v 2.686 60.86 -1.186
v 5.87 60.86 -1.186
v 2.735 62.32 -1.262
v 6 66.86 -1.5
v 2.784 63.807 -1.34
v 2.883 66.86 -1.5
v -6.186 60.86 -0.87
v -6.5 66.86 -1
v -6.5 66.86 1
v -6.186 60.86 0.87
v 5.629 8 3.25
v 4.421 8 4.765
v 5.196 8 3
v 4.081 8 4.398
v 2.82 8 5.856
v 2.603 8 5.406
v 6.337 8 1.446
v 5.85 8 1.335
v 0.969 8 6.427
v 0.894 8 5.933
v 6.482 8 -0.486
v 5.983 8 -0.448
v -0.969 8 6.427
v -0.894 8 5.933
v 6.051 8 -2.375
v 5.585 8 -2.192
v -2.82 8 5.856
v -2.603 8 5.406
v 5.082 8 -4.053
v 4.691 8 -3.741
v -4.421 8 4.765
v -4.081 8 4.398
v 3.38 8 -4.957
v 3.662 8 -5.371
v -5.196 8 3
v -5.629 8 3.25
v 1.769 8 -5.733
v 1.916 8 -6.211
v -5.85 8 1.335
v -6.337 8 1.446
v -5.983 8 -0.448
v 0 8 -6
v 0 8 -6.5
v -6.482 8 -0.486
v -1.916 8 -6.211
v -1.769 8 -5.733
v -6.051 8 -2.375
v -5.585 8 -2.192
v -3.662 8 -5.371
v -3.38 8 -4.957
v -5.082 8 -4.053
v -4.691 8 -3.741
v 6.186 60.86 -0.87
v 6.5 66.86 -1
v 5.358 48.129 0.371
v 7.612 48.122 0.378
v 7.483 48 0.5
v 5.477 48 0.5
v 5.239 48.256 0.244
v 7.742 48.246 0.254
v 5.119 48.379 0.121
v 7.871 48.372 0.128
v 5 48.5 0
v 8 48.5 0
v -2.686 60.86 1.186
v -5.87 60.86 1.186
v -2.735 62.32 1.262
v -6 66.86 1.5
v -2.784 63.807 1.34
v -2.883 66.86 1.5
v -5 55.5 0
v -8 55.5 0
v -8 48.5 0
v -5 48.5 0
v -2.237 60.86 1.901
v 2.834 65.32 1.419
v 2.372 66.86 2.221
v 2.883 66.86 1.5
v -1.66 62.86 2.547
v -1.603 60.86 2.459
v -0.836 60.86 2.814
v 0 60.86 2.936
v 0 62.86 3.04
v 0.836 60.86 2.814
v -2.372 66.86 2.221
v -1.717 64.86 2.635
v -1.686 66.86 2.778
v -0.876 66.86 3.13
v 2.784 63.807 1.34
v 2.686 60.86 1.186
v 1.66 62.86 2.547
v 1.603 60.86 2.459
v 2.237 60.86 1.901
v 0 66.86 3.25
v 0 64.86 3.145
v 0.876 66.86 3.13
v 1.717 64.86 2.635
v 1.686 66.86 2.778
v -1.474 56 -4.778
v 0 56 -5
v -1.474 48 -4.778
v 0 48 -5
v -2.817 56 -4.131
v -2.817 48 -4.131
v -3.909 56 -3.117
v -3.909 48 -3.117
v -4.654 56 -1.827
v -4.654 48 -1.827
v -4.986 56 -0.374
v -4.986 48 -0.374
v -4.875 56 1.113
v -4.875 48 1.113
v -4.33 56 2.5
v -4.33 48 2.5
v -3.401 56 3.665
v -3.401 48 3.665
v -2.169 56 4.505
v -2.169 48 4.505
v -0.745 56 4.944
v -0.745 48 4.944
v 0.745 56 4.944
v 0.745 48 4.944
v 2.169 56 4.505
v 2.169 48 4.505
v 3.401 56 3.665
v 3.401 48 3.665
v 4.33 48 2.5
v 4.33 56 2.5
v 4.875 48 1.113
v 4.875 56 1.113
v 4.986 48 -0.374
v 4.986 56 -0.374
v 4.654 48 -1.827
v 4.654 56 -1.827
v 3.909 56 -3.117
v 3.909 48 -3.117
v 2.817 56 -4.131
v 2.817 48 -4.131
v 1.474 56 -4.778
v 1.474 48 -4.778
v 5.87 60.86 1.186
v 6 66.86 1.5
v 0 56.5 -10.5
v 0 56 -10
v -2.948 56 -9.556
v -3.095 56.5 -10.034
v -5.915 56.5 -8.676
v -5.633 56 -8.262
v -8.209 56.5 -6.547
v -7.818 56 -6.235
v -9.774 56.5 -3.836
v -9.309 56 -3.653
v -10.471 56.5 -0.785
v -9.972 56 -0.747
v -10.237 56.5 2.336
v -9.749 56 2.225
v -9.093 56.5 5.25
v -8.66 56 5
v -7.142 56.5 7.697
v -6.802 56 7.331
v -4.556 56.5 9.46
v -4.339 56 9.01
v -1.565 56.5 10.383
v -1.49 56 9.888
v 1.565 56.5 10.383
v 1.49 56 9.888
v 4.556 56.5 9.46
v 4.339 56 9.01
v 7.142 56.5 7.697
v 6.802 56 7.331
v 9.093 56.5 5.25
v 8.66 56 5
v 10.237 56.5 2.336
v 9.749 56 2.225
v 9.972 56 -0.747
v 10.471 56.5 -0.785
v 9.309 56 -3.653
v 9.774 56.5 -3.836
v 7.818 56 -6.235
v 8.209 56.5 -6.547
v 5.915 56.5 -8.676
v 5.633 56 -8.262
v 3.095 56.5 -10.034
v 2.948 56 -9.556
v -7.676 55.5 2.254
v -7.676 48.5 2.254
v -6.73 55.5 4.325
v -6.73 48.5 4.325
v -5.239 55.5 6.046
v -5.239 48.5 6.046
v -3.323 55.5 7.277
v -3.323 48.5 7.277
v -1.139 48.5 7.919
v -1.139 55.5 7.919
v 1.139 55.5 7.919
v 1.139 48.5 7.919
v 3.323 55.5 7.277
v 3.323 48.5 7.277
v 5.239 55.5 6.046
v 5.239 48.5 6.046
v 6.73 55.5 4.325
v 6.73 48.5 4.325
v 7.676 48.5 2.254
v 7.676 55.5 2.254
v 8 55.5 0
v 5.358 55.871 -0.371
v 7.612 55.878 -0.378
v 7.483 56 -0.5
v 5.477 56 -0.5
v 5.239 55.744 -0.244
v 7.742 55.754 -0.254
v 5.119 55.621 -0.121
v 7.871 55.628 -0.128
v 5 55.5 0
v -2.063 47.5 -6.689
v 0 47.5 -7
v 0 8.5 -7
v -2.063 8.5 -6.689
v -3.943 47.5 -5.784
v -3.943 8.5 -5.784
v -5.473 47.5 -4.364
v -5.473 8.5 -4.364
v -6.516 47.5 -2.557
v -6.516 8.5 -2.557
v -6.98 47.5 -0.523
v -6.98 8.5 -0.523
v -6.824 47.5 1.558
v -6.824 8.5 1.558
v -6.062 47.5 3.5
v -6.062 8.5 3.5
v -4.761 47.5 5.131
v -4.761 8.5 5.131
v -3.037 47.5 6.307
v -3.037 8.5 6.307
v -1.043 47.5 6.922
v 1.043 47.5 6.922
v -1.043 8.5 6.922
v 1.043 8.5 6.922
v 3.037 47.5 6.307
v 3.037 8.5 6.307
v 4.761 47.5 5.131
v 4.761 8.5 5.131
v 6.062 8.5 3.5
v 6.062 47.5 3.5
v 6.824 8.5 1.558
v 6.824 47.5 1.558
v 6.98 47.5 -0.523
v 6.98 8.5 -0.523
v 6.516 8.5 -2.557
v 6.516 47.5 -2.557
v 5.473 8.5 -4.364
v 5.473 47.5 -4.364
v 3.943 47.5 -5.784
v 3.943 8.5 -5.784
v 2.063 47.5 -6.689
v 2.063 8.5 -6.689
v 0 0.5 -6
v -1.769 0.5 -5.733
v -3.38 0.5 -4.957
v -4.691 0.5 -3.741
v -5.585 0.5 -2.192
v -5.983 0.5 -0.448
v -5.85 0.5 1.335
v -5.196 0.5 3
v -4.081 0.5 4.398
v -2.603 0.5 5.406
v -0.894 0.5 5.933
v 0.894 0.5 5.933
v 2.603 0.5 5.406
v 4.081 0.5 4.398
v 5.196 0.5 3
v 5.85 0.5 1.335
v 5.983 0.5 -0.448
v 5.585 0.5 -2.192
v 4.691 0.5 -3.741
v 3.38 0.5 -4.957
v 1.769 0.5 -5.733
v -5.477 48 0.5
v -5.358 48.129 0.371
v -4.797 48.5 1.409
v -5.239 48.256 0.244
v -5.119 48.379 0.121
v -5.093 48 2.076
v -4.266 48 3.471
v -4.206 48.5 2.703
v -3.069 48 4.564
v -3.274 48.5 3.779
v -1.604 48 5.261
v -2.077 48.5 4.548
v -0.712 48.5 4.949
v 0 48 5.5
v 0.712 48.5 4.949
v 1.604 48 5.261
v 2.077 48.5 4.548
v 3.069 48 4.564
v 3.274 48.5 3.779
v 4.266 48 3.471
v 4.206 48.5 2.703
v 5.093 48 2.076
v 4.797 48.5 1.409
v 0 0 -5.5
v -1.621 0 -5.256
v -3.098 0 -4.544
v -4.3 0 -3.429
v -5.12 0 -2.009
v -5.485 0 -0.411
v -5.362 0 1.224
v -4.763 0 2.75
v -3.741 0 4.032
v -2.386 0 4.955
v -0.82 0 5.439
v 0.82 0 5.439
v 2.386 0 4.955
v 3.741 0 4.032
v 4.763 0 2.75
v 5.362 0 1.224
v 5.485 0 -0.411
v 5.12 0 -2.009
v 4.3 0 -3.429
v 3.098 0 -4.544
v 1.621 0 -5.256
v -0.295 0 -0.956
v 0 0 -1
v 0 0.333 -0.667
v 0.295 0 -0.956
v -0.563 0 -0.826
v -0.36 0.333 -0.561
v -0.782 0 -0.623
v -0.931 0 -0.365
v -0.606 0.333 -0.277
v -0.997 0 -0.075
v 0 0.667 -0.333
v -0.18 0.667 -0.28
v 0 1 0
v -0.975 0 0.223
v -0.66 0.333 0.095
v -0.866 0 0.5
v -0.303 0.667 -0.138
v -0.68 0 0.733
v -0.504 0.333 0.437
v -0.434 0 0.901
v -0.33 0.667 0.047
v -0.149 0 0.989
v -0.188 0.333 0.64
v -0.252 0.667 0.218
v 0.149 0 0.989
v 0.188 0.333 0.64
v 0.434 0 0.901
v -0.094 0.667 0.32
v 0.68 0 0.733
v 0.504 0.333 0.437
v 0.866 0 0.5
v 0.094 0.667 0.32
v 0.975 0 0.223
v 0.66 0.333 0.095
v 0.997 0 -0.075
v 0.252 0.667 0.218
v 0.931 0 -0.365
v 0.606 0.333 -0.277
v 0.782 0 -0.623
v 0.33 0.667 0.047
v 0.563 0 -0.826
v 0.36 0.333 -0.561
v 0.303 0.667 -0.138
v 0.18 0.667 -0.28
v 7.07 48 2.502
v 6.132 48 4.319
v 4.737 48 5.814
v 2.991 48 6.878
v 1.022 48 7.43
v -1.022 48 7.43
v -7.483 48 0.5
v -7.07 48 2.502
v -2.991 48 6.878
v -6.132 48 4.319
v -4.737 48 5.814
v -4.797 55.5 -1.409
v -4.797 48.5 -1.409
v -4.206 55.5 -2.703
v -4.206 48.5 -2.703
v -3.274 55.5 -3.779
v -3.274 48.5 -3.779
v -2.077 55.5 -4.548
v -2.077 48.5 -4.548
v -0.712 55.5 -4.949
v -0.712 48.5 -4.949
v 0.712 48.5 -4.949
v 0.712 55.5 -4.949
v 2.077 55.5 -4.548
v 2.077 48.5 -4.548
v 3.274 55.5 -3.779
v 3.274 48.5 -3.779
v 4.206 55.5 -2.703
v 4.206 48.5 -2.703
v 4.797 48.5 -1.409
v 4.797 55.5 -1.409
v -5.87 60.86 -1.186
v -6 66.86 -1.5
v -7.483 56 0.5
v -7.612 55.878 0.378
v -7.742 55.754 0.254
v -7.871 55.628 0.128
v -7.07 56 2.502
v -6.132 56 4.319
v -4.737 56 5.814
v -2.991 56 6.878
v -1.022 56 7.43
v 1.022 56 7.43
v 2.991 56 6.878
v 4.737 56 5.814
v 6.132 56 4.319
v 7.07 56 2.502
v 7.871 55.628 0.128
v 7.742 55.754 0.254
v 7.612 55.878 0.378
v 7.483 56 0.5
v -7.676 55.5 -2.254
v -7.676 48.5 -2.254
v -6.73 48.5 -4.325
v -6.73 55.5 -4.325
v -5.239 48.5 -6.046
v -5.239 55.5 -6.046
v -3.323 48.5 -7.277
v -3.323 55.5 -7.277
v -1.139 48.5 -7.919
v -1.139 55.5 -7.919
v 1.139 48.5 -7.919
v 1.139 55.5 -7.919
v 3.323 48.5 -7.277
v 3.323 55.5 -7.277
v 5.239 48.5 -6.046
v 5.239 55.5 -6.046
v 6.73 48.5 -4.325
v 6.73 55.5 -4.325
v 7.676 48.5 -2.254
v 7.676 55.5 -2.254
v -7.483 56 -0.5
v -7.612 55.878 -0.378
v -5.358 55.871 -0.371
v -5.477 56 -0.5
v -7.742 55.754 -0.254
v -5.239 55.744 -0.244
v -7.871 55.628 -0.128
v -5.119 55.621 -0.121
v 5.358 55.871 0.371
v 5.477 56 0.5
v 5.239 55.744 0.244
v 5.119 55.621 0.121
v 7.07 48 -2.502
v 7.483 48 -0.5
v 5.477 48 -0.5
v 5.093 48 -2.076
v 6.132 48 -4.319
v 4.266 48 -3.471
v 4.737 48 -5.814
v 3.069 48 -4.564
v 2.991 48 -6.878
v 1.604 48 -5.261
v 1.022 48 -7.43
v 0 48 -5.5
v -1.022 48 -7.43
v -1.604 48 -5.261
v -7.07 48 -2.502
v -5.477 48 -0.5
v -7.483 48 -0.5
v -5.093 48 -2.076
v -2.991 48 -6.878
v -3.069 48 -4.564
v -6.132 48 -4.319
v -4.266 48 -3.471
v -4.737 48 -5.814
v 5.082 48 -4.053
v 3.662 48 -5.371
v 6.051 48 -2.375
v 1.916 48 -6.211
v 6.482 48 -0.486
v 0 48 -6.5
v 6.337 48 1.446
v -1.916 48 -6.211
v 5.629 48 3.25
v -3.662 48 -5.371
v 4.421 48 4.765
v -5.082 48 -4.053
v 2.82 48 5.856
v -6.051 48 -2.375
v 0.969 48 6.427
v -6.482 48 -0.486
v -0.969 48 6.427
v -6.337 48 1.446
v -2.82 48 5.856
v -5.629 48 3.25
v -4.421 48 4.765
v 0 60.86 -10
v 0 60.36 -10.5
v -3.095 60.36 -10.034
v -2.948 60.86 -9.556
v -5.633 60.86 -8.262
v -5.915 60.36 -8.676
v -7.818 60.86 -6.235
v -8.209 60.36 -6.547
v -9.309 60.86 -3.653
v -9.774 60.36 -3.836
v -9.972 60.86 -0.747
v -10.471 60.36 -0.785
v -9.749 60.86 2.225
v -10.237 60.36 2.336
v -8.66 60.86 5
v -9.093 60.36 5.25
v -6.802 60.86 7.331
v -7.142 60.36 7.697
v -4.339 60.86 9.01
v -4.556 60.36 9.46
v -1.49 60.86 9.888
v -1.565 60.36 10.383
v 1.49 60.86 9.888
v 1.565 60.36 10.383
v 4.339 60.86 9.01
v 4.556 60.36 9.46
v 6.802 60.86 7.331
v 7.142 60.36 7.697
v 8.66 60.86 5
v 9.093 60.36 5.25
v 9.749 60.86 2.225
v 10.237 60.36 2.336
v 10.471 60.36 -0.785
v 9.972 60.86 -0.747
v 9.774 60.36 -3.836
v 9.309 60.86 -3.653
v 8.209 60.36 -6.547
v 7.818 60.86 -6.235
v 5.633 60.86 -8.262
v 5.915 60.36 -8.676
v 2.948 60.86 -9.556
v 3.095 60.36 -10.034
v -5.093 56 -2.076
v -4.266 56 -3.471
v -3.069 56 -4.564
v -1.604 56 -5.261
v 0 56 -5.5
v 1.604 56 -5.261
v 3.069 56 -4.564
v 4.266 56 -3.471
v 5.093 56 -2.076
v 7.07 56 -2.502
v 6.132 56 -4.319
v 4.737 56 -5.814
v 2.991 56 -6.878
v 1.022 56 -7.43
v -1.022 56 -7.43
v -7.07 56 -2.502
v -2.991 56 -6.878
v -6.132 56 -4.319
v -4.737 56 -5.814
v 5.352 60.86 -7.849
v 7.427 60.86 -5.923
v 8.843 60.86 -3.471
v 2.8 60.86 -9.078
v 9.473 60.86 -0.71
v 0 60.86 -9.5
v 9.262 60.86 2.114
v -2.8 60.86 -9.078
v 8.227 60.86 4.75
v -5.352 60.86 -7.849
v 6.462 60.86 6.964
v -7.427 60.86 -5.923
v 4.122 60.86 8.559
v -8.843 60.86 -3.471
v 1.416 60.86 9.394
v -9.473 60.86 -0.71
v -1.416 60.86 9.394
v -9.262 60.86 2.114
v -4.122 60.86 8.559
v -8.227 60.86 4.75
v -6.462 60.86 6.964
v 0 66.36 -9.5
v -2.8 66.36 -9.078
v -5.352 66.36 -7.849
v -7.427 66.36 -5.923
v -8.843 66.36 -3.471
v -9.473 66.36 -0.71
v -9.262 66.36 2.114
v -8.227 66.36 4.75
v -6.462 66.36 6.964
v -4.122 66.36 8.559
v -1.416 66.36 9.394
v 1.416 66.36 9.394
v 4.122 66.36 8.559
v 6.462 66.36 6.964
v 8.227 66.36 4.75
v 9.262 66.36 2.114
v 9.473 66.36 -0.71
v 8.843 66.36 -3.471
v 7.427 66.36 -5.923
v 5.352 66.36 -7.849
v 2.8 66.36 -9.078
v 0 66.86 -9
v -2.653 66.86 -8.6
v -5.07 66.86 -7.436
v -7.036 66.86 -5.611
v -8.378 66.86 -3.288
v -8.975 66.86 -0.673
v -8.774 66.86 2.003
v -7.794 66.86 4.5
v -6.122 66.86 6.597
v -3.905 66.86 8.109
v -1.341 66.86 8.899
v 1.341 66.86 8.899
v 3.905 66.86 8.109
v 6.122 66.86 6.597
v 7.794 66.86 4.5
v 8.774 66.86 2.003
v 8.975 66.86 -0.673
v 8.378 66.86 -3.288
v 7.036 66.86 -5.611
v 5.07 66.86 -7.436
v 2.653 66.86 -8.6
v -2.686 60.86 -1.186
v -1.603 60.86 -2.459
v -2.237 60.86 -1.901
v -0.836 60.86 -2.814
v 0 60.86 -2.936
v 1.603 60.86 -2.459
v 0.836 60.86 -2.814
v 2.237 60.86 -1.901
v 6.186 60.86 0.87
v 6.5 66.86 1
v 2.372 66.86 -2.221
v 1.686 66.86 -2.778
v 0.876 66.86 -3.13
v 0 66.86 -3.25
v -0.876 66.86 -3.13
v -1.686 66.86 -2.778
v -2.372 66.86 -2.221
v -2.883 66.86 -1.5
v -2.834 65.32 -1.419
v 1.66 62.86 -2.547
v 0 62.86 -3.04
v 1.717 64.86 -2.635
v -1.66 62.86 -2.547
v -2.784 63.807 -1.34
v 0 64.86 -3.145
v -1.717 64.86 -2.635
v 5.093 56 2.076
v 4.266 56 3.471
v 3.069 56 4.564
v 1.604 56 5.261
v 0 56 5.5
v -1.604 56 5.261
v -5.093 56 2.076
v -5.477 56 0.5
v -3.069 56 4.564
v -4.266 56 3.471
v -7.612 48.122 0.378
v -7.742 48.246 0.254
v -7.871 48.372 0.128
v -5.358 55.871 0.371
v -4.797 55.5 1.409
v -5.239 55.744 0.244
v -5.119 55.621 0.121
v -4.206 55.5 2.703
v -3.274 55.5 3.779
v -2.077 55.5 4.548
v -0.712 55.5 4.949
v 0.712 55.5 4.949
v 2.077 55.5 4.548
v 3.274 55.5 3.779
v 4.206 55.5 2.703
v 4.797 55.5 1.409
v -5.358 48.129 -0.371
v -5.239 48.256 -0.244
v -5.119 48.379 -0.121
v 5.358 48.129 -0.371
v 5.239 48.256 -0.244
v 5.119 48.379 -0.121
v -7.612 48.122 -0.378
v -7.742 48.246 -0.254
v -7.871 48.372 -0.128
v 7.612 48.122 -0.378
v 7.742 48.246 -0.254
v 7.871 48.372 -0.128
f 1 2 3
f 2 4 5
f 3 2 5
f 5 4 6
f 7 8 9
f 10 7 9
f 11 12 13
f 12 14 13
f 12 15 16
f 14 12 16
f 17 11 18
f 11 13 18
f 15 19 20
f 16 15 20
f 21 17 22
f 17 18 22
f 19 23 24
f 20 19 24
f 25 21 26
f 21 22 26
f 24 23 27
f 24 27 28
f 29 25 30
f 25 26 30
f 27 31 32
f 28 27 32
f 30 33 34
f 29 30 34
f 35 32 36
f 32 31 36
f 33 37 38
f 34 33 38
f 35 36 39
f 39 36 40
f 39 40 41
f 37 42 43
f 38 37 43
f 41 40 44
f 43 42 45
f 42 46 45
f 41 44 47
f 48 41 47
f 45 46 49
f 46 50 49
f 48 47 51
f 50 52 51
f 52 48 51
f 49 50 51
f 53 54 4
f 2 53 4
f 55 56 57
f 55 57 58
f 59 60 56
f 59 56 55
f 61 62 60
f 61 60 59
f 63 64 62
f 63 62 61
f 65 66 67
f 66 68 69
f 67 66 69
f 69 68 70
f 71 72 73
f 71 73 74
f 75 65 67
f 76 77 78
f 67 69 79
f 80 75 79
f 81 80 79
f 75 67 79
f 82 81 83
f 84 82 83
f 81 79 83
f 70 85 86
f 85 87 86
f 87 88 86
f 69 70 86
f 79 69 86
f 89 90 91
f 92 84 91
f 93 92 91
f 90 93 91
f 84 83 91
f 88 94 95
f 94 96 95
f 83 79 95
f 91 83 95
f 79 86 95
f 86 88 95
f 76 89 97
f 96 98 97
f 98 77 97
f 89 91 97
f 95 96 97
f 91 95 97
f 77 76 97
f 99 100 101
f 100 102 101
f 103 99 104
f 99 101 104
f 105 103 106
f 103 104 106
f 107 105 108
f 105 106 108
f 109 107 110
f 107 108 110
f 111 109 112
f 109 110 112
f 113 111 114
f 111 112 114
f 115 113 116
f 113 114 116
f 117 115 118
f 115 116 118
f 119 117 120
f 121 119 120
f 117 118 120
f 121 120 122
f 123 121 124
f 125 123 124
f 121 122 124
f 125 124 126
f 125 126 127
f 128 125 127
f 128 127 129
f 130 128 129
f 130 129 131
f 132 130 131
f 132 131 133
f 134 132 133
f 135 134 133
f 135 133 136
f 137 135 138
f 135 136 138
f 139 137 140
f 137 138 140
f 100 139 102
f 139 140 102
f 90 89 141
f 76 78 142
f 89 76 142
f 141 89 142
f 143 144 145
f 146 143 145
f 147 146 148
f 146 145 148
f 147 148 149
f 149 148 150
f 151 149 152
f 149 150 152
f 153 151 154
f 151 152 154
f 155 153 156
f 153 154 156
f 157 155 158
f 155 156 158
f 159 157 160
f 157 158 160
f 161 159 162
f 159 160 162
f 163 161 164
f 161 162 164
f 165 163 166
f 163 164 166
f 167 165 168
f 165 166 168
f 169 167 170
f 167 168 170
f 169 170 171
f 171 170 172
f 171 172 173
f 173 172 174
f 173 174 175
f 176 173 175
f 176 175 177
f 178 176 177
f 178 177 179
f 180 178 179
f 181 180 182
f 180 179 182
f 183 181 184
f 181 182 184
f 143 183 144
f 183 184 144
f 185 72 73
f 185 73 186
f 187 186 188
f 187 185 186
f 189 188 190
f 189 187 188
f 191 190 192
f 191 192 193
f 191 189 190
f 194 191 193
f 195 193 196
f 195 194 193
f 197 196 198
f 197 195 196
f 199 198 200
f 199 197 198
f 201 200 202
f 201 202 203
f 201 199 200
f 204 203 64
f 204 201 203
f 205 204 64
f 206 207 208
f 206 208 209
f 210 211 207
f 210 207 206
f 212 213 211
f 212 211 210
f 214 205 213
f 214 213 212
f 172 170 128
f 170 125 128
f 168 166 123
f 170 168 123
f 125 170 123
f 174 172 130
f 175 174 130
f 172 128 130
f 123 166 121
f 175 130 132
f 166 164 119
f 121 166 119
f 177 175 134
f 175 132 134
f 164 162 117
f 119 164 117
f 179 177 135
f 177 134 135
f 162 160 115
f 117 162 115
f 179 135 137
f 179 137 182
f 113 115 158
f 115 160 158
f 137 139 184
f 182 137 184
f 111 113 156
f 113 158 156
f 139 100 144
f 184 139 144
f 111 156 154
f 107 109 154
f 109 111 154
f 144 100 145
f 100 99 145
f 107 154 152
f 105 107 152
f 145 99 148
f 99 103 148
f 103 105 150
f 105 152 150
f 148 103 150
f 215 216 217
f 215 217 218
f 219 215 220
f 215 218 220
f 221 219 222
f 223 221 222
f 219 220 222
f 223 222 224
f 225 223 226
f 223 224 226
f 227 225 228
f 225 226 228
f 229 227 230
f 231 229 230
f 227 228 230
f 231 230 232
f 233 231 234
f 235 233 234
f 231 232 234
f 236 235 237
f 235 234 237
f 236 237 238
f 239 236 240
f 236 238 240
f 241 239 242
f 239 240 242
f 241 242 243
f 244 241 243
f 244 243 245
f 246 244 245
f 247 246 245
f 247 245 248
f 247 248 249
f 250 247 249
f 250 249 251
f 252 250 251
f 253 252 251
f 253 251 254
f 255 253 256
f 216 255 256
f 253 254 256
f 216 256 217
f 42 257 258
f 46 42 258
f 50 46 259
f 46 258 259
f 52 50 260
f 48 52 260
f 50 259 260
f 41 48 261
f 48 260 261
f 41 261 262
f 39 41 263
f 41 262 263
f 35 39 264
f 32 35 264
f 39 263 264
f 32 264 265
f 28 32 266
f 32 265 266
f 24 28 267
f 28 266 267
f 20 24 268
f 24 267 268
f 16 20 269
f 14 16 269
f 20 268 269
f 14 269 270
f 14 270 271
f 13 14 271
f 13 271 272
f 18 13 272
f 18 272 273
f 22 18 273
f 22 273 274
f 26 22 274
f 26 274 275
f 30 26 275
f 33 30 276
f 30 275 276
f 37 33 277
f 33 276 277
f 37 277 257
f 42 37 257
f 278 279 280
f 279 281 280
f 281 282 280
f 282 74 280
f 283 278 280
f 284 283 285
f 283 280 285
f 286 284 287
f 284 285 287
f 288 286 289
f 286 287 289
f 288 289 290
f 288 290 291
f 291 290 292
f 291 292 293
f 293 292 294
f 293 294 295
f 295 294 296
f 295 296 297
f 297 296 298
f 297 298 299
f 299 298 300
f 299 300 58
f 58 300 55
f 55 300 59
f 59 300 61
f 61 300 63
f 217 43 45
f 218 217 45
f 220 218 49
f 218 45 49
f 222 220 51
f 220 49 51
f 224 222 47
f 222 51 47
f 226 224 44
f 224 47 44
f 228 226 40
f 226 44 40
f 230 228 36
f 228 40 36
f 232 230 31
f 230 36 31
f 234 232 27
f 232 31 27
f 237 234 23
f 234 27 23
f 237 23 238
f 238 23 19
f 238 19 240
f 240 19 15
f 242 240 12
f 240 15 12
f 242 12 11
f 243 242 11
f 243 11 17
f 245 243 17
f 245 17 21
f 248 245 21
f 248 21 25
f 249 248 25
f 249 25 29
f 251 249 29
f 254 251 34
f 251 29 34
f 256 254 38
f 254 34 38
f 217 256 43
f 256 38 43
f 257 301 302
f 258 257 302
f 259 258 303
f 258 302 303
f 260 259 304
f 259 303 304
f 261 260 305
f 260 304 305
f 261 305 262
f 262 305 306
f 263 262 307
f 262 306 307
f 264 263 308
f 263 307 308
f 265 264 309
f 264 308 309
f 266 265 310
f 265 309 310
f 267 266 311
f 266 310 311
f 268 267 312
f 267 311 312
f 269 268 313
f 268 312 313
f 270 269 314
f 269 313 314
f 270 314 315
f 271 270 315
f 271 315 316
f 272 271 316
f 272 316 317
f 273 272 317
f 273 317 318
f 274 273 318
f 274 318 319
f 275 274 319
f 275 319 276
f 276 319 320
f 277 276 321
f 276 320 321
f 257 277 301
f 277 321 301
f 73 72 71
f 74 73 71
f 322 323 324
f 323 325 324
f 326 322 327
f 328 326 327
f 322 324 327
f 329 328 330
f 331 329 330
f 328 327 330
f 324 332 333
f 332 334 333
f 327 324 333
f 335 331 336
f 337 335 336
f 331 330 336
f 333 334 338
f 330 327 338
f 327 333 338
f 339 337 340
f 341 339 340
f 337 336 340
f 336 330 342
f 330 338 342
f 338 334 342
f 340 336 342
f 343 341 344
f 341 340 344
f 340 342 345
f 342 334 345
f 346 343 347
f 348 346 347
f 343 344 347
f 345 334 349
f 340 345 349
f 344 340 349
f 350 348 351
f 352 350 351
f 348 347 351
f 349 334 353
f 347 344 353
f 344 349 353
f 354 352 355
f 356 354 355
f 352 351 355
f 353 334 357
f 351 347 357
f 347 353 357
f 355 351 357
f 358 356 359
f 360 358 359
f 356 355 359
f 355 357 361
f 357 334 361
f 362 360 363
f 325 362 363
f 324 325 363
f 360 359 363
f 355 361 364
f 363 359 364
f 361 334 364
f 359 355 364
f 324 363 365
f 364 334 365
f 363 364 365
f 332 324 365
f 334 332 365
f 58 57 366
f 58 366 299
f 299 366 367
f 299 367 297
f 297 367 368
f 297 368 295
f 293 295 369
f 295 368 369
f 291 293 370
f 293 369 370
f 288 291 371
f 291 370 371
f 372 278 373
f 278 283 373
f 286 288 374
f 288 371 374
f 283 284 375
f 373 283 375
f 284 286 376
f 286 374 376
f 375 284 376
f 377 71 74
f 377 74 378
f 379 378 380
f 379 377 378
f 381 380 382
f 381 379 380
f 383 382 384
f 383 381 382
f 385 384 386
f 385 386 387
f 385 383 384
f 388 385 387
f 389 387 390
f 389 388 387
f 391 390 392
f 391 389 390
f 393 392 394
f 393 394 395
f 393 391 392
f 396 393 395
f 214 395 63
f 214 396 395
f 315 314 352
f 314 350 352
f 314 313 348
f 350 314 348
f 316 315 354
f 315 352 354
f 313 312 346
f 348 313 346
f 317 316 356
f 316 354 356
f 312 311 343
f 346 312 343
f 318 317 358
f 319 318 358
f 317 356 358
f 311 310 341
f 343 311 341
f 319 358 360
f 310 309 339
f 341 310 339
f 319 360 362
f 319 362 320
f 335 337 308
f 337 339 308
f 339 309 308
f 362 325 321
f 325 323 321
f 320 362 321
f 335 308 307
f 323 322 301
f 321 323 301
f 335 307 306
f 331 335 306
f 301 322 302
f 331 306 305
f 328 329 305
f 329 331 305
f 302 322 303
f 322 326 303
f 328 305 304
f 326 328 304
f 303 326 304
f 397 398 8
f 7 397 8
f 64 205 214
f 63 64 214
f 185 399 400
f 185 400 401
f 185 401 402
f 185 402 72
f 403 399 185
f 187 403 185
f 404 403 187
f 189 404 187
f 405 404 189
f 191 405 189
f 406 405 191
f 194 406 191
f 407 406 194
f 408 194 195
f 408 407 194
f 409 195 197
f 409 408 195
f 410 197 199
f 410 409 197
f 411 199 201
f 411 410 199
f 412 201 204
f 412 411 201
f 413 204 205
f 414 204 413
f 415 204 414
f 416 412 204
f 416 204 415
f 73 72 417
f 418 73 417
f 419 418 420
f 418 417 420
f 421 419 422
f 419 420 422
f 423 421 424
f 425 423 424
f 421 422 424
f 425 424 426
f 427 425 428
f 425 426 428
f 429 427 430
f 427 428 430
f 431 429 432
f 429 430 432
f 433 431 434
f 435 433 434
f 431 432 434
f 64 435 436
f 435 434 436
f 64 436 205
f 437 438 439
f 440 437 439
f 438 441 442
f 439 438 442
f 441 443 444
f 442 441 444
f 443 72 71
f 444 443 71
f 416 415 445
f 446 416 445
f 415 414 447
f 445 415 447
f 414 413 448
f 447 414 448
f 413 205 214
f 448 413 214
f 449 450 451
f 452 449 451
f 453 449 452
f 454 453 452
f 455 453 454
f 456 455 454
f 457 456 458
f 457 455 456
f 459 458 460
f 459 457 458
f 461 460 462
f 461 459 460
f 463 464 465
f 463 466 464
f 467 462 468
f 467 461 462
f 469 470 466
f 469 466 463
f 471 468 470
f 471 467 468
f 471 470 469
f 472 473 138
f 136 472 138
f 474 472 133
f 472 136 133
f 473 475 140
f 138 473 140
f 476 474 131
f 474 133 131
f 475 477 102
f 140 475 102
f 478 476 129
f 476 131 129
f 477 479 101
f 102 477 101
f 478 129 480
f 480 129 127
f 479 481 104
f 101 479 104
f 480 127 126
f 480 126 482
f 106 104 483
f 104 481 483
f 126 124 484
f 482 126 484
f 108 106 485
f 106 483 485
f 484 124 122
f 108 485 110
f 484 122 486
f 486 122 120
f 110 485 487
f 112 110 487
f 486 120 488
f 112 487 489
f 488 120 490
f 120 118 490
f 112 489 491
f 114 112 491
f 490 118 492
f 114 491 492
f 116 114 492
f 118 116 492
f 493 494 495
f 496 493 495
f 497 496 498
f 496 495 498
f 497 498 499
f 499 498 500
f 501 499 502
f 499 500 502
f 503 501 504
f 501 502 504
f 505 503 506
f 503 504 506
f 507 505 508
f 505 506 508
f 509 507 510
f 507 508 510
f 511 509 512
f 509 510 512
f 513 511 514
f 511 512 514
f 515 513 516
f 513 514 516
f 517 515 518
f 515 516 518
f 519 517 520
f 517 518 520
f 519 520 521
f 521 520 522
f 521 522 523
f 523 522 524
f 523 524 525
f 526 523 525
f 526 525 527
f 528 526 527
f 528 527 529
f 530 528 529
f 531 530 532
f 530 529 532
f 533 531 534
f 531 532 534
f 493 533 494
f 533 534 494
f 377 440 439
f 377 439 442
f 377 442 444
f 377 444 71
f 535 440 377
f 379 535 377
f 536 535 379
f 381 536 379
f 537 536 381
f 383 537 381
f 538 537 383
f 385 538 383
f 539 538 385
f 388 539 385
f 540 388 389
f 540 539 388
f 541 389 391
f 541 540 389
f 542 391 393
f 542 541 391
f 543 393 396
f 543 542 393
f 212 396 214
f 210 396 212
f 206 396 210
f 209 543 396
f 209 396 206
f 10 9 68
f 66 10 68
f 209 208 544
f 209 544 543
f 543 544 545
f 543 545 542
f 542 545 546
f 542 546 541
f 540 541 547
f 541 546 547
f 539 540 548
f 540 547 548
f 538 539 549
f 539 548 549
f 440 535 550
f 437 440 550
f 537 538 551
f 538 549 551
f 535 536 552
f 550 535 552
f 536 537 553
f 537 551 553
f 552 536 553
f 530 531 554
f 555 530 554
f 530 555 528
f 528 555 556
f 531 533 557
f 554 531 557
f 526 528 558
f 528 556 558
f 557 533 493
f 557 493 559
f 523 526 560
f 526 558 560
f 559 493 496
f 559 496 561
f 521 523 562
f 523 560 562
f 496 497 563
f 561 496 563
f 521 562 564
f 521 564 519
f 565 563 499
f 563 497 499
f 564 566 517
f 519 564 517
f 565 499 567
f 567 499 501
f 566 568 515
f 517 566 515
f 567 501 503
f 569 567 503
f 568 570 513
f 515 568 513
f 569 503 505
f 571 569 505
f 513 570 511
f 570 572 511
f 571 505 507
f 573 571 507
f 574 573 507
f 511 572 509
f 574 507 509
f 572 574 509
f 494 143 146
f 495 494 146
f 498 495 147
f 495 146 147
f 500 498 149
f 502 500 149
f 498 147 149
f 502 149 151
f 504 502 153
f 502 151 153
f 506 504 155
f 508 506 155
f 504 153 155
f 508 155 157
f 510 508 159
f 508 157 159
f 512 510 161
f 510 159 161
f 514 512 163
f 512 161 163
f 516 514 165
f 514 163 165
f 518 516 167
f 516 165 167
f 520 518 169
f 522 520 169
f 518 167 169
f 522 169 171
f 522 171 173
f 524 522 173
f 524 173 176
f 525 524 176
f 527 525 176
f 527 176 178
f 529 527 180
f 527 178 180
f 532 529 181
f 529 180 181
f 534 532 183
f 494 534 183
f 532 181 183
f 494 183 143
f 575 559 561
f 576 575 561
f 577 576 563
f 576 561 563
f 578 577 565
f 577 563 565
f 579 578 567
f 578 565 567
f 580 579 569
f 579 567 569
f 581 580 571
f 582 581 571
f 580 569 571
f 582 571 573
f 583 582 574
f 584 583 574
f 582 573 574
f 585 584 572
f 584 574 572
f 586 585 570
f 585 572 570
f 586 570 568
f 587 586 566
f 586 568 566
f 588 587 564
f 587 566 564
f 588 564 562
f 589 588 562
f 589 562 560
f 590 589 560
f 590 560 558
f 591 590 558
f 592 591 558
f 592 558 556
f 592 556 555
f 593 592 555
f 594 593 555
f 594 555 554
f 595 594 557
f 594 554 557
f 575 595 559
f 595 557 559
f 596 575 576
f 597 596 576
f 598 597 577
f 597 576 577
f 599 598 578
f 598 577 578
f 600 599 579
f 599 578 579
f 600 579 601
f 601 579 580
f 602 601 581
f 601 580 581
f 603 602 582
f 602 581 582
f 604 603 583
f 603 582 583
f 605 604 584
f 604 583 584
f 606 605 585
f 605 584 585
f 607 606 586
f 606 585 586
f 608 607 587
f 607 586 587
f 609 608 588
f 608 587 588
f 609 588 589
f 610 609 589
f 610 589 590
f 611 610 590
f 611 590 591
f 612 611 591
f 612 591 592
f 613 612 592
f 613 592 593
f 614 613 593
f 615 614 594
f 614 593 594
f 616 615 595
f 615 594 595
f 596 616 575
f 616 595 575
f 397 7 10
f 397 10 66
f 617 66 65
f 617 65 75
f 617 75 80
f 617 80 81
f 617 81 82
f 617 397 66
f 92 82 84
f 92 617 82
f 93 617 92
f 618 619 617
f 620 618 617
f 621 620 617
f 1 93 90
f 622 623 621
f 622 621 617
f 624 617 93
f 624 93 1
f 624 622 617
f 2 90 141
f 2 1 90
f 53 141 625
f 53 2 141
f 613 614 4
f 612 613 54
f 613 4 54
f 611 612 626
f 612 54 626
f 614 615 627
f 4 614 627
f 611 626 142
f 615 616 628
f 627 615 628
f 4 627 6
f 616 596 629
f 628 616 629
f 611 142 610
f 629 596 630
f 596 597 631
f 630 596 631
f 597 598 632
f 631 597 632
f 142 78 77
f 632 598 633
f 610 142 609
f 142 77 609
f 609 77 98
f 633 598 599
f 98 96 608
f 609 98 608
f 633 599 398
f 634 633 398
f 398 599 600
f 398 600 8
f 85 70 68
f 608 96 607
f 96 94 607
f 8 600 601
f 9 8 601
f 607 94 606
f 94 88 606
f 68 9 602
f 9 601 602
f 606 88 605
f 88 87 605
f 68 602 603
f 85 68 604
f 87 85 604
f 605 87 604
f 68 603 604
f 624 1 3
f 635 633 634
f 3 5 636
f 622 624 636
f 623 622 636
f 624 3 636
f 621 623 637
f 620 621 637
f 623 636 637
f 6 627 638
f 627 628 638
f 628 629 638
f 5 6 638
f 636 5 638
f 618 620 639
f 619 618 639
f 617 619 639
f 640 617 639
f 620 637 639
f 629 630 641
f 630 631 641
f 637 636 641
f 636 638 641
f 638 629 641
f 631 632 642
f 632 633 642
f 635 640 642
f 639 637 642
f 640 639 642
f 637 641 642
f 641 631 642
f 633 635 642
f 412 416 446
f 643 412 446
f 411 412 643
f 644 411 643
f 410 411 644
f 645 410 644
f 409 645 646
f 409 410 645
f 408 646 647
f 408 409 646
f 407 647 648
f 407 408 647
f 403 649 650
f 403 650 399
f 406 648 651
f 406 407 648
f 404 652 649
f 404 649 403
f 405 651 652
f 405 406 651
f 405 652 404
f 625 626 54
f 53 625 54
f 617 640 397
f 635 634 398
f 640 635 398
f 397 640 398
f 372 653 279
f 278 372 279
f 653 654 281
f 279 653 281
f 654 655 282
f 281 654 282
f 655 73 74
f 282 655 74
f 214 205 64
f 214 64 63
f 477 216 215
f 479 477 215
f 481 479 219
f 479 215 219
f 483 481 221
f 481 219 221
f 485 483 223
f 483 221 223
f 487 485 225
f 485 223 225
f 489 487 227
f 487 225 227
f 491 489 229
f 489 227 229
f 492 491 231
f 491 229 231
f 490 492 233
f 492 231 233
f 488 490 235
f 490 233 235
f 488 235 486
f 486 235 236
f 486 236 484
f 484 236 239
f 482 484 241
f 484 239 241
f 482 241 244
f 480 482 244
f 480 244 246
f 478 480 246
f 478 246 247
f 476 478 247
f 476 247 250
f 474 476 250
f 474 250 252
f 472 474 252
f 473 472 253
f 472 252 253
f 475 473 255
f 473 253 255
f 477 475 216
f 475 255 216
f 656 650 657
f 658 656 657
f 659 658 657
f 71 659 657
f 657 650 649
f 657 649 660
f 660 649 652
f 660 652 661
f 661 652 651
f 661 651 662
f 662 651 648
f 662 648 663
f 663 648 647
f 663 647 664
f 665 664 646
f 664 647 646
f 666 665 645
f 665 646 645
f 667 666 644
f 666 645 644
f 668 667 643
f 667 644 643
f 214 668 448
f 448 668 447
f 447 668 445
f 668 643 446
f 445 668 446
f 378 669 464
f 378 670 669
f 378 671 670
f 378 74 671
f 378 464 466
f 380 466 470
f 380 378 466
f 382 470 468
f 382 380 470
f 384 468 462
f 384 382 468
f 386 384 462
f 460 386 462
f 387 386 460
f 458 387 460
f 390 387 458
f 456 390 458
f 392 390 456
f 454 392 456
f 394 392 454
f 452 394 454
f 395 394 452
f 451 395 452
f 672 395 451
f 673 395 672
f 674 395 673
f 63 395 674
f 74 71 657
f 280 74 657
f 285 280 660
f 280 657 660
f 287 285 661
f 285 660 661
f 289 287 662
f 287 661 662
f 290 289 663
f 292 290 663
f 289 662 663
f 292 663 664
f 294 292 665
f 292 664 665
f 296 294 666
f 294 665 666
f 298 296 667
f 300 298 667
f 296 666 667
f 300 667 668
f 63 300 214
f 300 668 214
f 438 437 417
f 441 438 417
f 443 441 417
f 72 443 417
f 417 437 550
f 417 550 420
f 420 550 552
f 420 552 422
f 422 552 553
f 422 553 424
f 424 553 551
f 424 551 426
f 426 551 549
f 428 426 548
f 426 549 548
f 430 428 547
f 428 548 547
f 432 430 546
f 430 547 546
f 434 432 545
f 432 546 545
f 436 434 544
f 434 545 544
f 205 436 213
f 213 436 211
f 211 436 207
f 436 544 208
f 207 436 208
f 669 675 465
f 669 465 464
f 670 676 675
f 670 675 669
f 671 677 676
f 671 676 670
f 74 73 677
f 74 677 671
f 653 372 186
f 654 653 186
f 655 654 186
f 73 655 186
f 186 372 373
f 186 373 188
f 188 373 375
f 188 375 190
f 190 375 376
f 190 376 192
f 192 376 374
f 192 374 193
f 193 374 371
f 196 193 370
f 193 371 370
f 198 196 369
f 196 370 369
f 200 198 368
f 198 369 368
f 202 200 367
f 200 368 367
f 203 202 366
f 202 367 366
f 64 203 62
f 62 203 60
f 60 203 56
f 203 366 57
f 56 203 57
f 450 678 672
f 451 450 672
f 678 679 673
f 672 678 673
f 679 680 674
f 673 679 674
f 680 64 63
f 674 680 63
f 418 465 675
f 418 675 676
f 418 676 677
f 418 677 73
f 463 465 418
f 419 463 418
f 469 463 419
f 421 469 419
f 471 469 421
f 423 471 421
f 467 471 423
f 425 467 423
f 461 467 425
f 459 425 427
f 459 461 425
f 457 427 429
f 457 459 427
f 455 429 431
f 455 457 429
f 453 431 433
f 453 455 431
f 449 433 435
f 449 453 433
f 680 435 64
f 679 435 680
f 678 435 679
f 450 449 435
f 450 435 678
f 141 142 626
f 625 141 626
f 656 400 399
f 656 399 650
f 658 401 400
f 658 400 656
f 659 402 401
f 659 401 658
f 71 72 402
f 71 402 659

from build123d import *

# Parameters (mm, degrees)
CHAMFER1_SIZE                = 0.5
SKETCH2_R                    = 3.25
CUT_EXTRUDE1_DEPTH           = 6
CUT_EXTRUDE1_DRAFT           = -3
CUT_EXTRUDE1_PROFILE_2_DEPTH = 6
CUT_EXTRUDE1_PROFILE_2_DRAFT = -3
SKETCH3_W                    = 3
SKETCH3_H                    = 8
REVOLVE2_ANGLE               = 180
CHAMFER2_SIZE                = 0.5


with BuildPart() as part:
    # Sketch1 → Revolve1 (revolve)
    with BuildSketch(Plane(origin=(0, 0, 0), x_dir=(0, 0, -1), z_dir=(1, 0, 0))):
        Polygon((0, 1), (0, 66.86), (9.5, 66.86), (9.5, 60.86), (10.5, 60.86), (10.5, 56), (5, 56), (5, 48), (7, 48), (7, 8), (6, 8), (6, 0), (1, 0), align=None)
    revolve(axis=Axis((0, 1, 0), (0, 1, 0)))

    # Chamfer1
    chamfer1_edges = [part.edges().sort_by_distance(p)[0] for p in [
        (0, 0, 6),
        (0, 8, 7),
        (0, 48, 7),
        (0, 56, 10.5),
        (0, 60.86, 10.5),
        (0, 66.86, 9.5),
    ]]
    chamfer(chamfer1_edges, length=CHAMFER1_SIZE)


with BuildPart() as cut_extrude1_tool:
    # Sketch2 → Cut-Extrude1 (with draft: the straight prism first)
    with BuildSketch(Plane(origin=(0, 66.86, 0), x_dir=(1, 0, 0), z_dir=(0, 1, 0))):
        Circle(SKETCH2_R)
    extrude(amount=-CUT_EXTRUDE1_DEPTH)
    # Cut-Extrude1: the draft: its side faces are tilted about the plane it starts from
    cut_extrude1_sides = [cut_extrude1_tool.faces().sort_by_distance(p)[0] for p in [
        (-3.25, 63.86, 0),
    ]]
    draft(cut_extrude1_sides, Plane(origin=(0, 66.86, 0), x_dir=(1, 0, 0), z_dir=(0, 1, 0)), CUT_EXTRUDE1_DRAFT)


with BuildPart() as part_1:
    add(part.part)

    # Cut-Extrude1: cut by cut_extrude1_tool
    add(cut_extrude1_tool.part, mode=Mode.SUBTRACT)


with BuildPart() as cut_extrude1_profile_2_tool:
    # Sketch2 → Cut-Extrude1 profile 2 (with draft: the straight prism first)
    with BuildSketch(Plane(origin=(0, 66.86, 0), x_dir=(1, 0, 0), z_dir=(0, 1, 0))):
        Polygon((-6, 1.5), (-6.5, 1), (-6.5, -1), (-6, -1.5), (6, -1.5), (6.5, -1), (6.5, 1), (6, 1.5), align=None)
    extrude(amount=-CUT_EXTRUDE1_PROFILE_2_DEPTH)
    # Cut-Extrude1 profile 2: the draft: its side faces are tilted about the plane it starts from
    cut_extrude1_profile_2_sides = [cut_extrude1_profile_2_tool.faces().sort_by_distance(p)[0] for p in [
        (-6.25, 63.86, -1.25),
        (-6.5, 63.86, 0),
        (-6.25, 63.86, 1.25),
        (0, 63.86, 1.5),
        (6.25, 63.86, 1.25),
        (6.5, 63.86, 0),
        (6.25, 63.86, -1.25),
        (0, 63.86, -1.5),
    ]]
    draft(cut_extrude1_profile_2_sides, Plane(origin=(0, 66.86, 0), x_dir=(1, 0, 0), z_dir=(0, 1, 0)), CUT_EXTRUDE1_PROFILE_2_DRAFT)


with BuildPart() as part_2:
    add(part_1.part)

    # Cut-Extrude1 profile 2: cut by cut_extrude1_profile_2_tool
    add(cut_extrude1_profile_2_tool.part, mode=Mode.SUBTRACT)


with BuildPart() as body_2:
    # Sketch3 → Revolve2 (revolve)
    with BuildSketch(Plane.XY):
        with Locations((-6.5, 52)):
            Rectangle(SKETCH3_W, SKETCH3_H)
    revolve(axis=Axis((0, 1, 0), (0, -1, 0)), revolution_arc=REVOLVE2_ANGLE)

    # Chamfer2
    chamfer2_edges = [body_2.edges().sort_by_distance(p)[0] for p in [
        (6.5, 56, 0),
        (-6.5, 56, 0),
        (-6.5, 48, 0),
        (0, 56, -8),
        (0, 56, -5),
        (0, 48, -5),
        (0, 48, -8),
        (6.5, 48, 0),
    ]]
    chamfer(chamfer2_edges, length=CHAMFER2_SIZE)


with BuildPart() as body_3:
    # Mirror1: mirrored copy
    add(body_2.part.mirror(Plane.XY))


solid = Compound([part_2.part, body_2.part, body_3.part])
